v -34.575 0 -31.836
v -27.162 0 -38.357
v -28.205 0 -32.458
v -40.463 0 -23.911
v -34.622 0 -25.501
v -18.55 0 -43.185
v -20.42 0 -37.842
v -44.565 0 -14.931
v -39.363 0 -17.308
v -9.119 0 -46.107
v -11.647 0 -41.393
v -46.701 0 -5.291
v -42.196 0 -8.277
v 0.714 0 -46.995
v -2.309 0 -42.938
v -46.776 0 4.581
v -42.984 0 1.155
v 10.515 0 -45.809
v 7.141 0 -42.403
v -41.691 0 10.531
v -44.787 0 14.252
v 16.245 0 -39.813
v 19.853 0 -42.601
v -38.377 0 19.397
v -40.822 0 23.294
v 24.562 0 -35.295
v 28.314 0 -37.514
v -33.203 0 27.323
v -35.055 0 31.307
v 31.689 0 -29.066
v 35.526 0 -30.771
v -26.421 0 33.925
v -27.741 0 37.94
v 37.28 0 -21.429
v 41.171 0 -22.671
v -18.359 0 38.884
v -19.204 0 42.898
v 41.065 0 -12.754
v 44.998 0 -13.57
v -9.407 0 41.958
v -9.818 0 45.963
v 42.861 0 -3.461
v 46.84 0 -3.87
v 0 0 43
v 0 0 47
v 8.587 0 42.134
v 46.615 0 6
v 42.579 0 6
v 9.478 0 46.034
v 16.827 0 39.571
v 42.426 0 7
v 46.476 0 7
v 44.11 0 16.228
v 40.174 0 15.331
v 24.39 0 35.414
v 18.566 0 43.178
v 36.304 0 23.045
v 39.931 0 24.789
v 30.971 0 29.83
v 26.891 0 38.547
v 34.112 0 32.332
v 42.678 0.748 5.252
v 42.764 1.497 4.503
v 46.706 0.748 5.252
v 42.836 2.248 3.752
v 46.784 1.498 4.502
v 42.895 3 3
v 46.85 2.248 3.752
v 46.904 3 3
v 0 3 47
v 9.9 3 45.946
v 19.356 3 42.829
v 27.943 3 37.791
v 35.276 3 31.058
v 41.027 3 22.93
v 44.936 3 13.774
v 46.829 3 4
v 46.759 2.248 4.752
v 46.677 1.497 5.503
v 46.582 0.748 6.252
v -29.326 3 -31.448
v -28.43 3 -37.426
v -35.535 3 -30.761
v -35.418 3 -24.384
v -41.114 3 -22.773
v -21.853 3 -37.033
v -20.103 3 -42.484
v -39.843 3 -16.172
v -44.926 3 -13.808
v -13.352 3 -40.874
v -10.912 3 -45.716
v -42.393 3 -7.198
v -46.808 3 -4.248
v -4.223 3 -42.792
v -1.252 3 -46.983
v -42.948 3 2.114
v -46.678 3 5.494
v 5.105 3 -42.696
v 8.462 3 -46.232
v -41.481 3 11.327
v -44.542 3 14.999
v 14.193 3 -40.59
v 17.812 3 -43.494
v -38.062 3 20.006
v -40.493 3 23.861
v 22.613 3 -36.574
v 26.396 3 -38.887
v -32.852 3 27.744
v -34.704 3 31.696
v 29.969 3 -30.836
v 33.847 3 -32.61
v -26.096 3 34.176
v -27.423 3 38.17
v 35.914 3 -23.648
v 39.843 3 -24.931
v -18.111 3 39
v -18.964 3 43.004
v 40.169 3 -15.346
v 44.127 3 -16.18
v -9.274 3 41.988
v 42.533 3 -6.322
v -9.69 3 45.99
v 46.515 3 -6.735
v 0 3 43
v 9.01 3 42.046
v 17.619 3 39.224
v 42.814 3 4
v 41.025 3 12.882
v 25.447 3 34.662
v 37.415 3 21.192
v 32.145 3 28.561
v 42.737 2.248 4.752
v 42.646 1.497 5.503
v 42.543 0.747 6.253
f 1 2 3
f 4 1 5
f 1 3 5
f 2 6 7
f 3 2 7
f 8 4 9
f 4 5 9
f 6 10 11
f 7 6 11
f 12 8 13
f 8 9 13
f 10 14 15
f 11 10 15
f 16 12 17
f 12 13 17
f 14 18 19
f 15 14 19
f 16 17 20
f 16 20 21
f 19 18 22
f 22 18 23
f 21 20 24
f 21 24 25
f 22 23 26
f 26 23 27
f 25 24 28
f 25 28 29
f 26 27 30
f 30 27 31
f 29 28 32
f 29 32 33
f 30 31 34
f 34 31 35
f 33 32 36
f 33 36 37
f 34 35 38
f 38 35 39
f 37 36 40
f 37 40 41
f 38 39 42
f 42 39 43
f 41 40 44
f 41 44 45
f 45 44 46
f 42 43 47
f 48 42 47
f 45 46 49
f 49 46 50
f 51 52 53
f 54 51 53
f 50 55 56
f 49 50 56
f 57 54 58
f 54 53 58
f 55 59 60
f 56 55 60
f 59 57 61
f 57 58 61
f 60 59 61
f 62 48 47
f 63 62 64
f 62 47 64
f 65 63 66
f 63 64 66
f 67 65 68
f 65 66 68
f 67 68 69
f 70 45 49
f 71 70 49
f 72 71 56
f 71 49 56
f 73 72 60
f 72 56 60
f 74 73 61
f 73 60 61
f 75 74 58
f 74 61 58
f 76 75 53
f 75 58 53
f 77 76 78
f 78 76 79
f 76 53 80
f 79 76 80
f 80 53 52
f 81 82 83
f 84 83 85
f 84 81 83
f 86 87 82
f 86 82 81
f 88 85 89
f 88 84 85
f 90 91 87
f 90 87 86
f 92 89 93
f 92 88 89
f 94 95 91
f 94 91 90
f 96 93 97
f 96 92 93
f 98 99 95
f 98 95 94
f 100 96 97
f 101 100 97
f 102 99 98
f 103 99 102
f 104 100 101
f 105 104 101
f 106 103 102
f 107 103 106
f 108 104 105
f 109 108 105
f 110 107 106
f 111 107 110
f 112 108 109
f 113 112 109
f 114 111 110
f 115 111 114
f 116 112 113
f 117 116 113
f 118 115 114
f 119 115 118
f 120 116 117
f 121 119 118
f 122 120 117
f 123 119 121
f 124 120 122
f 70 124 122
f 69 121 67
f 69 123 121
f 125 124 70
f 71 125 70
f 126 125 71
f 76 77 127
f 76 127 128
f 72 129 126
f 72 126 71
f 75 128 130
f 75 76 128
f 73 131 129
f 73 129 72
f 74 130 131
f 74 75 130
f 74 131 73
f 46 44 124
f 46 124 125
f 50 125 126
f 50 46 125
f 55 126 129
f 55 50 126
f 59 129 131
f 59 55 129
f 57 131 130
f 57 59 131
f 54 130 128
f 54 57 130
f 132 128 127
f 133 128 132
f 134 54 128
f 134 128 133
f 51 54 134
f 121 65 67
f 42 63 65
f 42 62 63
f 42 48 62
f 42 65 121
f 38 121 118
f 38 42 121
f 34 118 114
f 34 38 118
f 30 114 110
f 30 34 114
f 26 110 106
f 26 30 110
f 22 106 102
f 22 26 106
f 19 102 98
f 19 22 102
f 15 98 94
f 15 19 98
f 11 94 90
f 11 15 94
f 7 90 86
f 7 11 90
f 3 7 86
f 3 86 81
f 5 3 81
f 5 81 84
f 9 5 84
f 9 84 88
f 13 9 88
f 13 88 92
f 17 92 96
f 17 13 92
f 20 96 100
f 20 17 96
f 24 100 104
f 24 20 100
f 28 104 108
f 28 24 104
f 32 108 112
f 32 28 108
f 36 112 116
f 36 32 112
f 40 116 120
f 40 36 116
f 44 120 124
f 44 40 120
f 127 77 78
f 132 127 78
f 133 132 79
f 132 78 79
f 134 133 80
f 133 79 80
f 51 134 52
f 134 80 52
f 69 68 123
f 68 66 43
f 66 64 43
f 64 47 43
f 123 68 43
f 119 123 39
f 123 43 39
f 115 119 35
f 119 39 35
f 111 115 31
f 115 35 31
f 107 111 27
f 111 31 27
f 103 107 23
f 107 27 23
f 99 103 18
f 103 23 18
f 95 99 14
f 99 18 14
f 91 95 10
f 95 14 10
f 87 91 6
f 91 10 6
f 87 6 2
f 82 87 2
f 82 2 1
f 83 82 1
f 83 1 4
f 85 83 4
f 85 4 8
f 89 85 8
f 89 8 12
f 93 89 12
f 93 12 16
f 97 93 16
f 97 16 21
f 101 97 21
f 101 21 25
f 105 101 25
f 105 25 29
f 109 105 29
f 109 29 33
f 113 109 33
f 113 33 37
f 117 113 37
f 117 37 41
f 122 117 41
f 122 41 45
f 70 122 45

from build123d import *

# Parameters (mm, degrees)
SKETCH1_R           = 47
SKETCH1_R_2         = 43
BOSS_EXTRUDE1_DEPTH = 3
CUT_EXTRUDE1_DEPTH  = 10


with BuildPart() as part:
    # Sketch1 → Boss-Extrude1 (new body)
    with BuildSketch(Plane(origin=(0, 0, 0), x_dir=(1, 0, 0), z_dir=(0, 1, 0))):
        with Locations(Location((0, 0, 0), (0, 0, 270))):
            Circle(SKETCH1_R)
        with Locations(Location((0, 0, 0), (0, 0, 270))):
            Circle(SKETCH1_R_2, mode=Mode.SUBTRACT)
    extrude(amount=BOSS_EXTRUDE1_DEPTH)

    # Sketch3 → Cut-Extrude1 (cut)
    with BuildSketch(Plane(origin=(47, 0, 0), x_dir=(0, 0, -1), z_dir=(1, 0, 0))):
        Polygon((-4, 3), (-7, 0), (-6, 0), (-3, 3), align=None)
    extrude(amount=-CUT_EXTRUDE1_DEPTH, mode=Mode.SUBTRACT)


solid = part.part
